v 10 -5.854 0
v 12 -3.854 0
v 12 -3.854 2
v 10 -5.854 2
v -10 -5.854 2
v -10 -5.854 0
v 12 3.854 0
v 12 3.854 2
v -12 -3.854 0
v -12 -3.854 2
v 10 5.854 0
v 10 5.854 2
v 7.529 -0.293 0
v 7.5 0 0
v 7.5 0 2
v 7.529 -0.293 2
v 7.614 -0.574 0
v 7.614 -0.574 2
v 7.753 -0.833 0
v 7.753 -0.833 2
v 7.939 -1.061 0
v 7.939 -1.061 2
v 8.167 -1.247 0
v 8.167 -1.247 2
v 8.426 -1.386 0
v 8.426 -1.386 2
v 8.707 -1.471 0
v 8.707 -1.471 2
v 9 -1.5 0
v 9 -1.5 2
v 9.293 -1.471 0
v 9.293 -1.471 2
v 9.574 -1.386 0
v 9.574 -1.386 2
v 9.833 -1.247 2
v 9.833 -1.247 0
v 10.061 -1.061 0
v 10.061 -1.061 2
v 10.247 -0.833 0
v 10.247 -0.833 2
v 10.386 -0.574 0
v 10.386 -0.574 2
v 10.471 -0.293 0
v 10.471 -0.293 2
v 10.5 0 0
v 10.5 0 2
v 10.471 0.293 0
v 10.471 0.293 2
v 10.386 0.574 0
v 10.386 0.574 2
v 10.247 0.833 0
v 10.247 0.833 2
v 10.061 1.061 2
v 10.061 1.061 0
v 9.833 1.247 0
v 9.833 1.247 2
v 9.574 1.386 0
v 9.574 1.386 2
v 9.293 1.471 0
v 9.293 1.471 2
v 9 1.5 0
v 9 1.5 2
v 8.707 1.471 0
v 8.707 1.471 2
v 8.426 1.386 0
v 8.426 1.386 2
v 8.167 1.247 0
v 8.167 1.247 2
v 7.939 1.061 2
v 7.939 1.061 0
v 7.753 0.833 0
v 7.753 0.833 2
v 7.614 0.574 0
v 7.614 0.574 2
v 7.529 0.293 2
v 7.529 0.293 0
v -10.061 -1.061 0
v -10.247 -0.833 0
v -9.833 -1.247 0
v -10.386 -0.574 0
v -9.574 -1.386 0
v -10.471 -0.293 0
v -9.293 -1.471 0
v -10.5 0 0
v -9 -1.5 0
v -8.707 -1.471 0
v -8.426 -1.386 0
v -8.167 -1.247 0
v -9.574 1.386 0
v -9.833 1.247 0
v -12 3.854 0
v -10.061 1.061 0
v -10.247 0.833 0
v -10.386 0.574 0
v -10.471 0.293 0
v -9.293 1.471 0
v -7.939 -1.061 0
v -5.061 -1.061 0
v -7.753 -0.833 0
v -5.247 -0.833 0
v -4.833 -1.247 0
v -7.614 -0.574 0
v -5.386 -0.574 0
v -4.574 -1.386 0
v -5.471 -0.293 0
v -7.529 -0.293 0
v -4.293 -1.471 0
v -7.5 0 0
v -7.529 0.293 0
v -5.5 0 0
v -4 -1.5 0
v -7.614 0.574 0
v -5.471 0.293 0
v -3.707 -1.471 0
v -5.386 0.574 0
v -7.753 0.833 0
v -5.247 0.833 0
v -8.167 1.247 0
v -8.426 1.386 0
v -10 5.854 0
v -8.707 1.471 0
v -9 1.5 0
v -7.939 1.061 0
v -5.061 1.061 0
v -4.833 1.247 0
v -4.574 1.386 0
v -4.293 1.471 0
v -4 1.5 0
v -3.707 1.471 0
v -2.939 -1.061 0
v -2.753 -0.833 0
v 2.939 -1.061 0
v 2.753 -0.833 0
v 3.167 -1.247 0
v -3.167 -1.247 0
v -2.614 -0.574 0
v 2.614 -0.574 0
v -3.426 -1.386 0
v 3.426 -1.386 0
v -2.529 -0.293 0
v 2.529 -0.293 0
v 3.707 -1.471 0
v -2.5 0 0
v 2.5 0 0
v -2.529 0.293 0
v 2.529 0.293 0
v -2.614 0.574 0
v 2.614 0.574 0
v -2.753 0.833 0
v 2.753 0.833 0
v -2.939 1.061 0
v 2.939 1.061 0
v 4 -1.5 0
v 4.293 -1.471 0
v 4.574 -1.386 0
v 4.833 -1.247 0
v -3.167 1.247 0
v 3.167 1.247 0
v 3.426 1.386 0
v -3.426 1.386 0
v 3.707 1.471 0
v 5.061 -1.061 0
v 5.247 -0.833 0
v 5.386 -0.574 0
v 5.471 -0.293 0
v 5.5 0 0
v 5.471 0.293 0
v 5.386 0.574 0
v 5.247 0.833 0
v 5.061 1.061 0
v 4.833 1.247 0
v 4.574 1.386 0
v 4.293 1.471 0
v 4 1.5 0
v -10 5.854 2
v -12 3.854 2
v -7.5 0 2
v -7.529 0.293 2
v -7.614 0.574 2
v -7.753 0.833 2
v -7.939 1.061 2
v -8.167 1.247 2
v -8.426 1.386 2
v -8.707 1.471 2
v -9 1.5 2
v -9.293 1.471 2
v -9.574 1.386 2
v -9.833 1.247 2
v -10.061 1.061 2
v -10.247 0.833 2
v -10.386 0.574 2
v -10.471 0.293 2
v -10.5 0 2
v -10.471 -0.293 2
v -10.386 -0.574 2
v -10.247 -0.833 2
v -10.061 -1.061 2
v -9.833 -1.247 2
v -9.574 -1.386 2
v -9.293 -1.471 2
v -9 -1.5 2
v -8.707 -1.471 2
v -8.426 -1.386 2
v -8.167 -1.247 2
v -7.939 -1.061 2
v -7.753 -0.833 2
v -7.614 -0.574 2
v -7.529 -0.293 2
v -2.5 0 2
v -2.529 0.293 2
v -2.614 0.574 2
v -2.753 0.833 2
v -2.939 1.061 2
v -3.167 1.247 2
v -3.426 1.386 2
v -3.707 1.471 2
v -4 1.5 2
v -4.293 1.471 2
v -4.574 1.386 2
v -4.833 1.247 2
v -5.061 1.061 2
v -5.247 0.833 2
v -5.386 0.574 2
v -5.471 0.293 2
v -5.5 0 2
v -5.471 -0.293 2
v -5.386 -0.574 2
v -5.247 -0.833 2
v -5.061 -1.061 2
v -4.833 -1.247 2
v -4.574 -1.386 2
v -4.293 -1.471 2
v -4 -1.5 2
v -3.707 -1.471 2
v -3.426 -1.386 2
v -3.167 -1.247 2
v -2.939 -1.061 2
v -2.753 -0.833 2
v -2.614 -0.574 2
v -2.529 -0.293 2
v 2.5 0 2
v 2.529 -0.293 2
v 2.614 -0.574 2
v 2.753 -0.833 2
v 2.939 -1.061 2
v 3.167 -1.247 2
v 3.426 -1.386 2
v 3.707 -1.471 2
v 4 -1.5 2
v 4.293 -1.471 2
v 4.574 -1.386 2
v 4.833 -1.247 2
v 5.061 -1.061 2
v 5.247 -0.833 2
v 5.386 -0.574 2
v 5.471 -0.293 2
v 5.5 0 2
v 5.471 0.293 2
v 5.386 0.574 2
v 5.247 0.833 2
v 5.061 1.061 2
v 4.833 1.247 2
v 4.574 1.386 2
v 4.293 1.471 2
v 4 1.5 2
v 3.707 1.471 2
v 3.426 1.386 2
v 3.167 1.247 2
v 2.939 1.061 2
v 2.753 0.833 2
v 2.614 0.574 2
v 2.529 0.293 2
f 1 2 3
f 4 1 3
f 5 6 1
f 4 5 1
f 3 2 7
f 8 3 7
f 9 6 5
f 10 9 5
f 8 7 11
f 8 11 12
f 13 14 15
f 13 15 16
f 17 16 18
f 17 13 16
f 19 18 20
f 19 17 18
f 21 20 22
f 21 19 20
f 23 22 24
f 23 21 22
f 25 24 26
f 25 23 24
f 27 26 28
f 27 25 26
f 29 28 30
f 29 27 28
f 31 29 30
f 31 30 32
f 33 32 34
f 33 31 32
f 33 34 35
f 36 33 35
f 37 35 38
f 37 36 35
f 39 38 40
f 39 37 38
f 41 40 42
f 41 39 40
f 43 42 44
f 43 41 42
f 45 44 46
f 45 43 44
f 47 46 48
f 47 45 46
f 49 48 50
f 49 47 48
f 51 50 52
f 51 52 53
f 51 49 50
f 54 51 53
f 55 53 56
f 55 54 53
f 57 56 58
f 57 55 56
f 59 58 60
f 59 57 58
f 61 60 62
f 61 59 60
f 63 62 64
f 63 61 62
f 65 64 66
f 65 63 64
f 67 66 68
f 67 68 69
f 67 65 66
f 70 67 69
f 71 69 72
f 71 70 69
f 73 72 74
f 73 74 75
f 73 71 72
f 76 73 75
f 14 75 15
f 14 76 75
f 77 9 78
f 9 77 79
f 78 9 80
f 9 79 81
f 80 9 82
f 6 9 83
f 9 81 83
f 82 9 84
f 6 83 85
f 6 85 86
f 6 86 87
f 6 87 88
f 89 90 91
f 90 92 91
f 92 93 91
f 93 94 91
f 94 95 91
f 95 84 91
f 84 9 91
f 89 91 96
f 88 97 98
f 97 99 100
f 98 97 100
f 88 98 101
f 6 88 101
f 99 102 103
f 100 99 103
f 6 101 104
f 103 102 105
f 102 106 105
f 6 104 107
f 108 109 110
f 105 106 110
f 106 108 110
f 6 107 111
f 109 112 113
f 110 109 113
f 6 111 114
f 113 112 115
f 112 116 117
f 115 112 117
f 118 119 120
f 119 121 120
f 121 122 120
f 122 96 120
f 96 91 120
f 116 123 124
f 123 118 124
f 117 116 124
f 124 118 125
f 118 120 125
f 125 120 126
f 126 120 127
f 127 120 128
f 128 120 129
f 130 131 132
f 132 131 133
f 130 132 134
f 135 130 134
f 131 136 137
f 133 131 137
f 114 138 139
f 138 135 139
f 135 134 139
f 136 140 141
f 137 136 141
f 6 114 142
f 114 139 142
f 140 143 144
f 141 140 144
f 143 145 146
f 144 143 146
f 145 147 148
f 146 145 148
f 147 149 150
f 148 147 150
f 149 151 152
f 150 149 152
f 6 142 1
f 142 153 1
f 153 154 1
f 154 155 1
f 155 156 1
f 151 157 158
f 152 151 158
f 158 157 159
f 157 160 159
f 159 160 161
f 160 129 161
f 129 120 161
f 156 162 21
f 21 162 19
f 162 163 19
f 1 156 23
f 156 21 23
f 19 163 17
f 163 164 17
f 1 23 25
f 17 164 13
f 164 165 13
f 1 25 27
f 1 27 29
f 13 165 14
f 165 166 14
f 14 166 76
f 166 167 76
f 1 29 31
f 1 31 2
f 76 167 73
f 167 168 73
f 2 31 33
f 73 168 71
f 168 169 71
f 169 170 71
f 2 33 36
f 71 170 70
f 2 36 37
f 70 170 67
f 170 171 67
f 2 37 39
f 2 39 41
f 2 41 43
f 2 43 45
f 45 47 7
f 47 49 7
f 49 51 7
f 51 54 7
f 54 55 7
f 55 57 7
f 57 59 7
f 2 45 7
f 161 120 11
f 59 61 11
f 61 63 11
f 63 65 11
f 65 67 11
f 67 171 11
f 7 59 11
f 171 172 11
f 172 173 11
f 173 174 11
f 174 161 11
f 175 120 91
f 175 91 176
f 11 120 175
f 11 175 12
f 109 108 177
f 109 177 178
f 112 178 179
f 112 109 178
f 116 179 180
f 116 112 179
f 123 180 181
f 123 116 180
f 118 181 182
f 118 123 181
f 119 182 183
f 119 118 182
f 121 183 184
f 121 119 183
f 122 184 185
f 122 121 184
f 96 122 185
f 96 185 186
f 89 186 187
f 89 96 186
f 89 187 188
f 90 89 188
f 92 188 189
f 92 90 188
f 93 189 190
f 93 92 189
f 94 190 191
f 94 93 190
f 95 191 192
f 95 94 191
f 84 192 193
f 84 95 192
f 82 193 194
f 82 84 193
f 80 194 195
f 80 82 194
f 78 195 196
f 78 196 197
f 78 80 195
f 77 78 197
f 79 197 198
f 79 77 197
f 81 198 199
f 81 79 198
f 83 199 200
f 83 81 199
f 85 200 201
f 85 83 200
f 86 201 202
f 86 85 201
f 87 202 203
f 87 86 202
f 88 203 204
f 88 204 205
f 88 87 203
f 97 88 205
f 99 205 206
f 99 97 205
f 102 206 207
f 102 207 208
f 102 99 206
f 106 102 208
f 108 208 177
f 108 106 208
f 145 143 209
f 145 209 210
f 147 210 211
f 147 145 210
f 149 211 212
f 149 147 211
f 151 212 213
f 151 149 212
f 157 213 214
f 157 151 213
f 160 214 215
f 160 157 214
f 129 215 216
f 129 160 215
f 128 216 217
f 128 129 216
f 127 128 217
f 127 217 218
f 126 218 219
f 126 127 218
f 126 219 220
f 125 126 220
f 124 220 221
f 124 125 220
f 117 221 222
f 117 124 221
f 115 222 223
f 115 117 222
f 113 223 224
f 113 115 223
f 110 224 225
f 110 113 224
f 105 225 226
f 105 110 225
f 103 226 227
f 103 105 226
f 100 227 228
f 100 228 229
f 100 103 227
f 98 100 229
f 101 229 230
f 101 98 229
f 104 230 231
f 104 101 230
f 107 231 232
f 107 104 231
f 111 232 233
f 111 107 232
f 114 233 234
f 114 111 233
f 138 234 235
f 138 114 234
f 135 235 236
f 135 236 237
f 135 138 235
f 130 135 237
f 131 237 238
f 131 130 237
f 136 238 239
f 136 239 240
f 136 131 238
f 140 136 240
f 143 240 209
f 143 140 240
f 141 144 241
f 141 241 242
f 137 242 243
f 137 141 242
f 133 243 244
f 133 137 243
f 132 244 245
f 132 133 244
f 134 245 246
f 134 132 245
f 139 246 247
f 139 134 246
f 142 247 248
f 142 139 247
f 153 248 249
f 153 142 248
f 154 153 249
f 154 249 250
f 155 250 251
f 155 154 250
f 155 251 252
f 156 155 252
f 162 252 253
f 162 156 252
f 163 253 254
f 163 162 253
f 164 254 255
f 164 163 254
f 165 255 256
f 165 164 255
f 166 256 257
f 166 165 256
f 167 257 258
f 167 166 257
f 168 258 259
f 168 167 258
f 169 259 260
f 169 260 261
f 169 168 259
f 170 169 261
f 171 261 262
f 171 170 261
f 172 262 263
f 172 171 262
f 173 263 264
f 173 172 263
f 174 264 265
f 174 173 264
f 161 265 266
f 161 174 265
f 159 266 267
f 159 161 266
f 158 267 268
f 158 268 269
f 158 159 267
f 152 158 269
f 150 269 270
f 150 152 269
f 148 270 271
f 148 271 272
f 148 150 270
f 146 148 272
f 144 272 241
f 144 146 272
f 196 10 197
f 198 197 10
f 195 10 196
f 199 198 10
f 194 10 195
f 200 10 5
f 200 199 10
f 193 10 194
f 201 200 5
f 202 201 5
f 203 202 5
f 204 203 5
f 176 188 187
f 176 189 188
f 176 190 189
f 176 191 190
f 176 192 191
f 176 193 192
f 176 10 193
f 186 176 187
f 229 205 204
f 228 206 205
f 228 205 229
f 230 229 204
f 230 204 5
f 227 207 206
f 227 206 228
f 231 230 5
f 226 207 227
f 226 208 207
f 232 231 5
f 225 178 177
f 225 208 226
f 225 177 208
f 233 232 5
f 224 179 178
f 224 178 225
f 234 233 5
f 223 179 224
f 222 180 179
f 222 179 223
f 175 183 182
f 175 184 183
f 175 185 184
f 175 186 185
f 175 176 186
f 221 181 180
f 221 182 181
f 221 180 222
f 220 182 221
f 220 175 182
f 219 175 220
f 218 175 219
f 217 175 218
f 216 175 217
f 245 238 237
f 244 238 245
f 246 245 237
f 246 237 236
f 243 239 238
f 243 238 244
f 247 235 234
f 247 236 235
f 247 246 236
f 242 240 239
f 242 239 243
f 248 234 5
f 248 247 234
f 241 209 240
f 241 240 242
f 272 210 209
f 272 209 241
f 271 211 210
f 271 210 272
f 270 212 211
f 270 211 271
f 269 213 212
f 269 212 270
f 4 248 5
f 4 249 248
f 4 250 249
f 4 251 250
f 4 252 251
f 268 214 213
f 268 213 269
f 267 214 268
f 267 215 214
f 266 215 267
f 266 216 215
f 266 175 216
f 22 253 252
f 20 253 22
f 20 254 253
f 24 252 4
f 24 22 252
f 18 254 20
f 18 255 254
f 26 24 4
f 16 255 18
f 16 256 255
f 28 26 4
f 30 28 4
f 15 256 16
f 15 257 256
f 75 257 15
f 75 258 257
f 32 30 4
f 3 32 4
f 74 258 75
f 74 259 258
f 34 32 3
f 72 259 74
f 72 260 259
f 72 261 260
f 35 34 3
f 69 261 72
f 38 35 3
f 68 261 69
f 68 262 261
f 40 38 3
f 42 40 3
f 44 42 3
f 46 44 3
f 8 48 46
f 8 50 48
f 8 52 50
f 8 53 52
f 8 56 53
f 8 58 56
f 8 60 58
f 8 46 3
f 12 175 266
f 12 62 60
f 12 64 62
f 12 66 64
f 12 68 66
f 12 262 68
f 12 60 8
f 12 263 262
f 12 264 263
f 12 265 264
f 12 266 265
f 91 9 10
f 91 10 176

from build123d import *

# Parameters (mm, degrees)
SKETCH1_W           = 24
SKETCH1_H           = 11.708497378
SKETCH1_R           = 1.5
BOSS_EXTRUDE1_DEPTH = 2
CHAMFER1_SIZE       = 2


with BuildPart() as part:
    # Sketch1 → Boss-Extrude1 (new body)
    with BuildSketch(Plane.XY):
        Rectangle(SKETCH1_W, SKETCH1_H)
        with Locations((-9, 0)):
            Circle(SKETCH1_R, mode=Mode.SUBTRACT)
        with Locations((-4, 0)):
            Circle(SKETCH1_R, mode=Mode.SUBTRACT)
        with Locations(Location((4, 0, 0), (0, 0, 180))):
            Circle(SKETCH1_R, mode=Mode.SUBTRACT)
        with Locations(Location((9, 0, 0), (0, 0, 180))):
            Circle(SKETCH1_R, mode=Mode.SUBTRACT)
    extrude(amount=BOSS_EXTRUDE1_DEPTH)

    # Chamfer1
    chamfer1_edges = [part.edges().sort_by_distance(p)[0] for p in [
        (12, -5.854248689, 1),
        (-12, -5.854248689, 1),
        (-12, 5.854248689, 1),
        (12, 5.854248689, 1),
    ]]
    chamfer(chamfer1_edges, length=CHAMFER1_SIZE)


solid = part.part
